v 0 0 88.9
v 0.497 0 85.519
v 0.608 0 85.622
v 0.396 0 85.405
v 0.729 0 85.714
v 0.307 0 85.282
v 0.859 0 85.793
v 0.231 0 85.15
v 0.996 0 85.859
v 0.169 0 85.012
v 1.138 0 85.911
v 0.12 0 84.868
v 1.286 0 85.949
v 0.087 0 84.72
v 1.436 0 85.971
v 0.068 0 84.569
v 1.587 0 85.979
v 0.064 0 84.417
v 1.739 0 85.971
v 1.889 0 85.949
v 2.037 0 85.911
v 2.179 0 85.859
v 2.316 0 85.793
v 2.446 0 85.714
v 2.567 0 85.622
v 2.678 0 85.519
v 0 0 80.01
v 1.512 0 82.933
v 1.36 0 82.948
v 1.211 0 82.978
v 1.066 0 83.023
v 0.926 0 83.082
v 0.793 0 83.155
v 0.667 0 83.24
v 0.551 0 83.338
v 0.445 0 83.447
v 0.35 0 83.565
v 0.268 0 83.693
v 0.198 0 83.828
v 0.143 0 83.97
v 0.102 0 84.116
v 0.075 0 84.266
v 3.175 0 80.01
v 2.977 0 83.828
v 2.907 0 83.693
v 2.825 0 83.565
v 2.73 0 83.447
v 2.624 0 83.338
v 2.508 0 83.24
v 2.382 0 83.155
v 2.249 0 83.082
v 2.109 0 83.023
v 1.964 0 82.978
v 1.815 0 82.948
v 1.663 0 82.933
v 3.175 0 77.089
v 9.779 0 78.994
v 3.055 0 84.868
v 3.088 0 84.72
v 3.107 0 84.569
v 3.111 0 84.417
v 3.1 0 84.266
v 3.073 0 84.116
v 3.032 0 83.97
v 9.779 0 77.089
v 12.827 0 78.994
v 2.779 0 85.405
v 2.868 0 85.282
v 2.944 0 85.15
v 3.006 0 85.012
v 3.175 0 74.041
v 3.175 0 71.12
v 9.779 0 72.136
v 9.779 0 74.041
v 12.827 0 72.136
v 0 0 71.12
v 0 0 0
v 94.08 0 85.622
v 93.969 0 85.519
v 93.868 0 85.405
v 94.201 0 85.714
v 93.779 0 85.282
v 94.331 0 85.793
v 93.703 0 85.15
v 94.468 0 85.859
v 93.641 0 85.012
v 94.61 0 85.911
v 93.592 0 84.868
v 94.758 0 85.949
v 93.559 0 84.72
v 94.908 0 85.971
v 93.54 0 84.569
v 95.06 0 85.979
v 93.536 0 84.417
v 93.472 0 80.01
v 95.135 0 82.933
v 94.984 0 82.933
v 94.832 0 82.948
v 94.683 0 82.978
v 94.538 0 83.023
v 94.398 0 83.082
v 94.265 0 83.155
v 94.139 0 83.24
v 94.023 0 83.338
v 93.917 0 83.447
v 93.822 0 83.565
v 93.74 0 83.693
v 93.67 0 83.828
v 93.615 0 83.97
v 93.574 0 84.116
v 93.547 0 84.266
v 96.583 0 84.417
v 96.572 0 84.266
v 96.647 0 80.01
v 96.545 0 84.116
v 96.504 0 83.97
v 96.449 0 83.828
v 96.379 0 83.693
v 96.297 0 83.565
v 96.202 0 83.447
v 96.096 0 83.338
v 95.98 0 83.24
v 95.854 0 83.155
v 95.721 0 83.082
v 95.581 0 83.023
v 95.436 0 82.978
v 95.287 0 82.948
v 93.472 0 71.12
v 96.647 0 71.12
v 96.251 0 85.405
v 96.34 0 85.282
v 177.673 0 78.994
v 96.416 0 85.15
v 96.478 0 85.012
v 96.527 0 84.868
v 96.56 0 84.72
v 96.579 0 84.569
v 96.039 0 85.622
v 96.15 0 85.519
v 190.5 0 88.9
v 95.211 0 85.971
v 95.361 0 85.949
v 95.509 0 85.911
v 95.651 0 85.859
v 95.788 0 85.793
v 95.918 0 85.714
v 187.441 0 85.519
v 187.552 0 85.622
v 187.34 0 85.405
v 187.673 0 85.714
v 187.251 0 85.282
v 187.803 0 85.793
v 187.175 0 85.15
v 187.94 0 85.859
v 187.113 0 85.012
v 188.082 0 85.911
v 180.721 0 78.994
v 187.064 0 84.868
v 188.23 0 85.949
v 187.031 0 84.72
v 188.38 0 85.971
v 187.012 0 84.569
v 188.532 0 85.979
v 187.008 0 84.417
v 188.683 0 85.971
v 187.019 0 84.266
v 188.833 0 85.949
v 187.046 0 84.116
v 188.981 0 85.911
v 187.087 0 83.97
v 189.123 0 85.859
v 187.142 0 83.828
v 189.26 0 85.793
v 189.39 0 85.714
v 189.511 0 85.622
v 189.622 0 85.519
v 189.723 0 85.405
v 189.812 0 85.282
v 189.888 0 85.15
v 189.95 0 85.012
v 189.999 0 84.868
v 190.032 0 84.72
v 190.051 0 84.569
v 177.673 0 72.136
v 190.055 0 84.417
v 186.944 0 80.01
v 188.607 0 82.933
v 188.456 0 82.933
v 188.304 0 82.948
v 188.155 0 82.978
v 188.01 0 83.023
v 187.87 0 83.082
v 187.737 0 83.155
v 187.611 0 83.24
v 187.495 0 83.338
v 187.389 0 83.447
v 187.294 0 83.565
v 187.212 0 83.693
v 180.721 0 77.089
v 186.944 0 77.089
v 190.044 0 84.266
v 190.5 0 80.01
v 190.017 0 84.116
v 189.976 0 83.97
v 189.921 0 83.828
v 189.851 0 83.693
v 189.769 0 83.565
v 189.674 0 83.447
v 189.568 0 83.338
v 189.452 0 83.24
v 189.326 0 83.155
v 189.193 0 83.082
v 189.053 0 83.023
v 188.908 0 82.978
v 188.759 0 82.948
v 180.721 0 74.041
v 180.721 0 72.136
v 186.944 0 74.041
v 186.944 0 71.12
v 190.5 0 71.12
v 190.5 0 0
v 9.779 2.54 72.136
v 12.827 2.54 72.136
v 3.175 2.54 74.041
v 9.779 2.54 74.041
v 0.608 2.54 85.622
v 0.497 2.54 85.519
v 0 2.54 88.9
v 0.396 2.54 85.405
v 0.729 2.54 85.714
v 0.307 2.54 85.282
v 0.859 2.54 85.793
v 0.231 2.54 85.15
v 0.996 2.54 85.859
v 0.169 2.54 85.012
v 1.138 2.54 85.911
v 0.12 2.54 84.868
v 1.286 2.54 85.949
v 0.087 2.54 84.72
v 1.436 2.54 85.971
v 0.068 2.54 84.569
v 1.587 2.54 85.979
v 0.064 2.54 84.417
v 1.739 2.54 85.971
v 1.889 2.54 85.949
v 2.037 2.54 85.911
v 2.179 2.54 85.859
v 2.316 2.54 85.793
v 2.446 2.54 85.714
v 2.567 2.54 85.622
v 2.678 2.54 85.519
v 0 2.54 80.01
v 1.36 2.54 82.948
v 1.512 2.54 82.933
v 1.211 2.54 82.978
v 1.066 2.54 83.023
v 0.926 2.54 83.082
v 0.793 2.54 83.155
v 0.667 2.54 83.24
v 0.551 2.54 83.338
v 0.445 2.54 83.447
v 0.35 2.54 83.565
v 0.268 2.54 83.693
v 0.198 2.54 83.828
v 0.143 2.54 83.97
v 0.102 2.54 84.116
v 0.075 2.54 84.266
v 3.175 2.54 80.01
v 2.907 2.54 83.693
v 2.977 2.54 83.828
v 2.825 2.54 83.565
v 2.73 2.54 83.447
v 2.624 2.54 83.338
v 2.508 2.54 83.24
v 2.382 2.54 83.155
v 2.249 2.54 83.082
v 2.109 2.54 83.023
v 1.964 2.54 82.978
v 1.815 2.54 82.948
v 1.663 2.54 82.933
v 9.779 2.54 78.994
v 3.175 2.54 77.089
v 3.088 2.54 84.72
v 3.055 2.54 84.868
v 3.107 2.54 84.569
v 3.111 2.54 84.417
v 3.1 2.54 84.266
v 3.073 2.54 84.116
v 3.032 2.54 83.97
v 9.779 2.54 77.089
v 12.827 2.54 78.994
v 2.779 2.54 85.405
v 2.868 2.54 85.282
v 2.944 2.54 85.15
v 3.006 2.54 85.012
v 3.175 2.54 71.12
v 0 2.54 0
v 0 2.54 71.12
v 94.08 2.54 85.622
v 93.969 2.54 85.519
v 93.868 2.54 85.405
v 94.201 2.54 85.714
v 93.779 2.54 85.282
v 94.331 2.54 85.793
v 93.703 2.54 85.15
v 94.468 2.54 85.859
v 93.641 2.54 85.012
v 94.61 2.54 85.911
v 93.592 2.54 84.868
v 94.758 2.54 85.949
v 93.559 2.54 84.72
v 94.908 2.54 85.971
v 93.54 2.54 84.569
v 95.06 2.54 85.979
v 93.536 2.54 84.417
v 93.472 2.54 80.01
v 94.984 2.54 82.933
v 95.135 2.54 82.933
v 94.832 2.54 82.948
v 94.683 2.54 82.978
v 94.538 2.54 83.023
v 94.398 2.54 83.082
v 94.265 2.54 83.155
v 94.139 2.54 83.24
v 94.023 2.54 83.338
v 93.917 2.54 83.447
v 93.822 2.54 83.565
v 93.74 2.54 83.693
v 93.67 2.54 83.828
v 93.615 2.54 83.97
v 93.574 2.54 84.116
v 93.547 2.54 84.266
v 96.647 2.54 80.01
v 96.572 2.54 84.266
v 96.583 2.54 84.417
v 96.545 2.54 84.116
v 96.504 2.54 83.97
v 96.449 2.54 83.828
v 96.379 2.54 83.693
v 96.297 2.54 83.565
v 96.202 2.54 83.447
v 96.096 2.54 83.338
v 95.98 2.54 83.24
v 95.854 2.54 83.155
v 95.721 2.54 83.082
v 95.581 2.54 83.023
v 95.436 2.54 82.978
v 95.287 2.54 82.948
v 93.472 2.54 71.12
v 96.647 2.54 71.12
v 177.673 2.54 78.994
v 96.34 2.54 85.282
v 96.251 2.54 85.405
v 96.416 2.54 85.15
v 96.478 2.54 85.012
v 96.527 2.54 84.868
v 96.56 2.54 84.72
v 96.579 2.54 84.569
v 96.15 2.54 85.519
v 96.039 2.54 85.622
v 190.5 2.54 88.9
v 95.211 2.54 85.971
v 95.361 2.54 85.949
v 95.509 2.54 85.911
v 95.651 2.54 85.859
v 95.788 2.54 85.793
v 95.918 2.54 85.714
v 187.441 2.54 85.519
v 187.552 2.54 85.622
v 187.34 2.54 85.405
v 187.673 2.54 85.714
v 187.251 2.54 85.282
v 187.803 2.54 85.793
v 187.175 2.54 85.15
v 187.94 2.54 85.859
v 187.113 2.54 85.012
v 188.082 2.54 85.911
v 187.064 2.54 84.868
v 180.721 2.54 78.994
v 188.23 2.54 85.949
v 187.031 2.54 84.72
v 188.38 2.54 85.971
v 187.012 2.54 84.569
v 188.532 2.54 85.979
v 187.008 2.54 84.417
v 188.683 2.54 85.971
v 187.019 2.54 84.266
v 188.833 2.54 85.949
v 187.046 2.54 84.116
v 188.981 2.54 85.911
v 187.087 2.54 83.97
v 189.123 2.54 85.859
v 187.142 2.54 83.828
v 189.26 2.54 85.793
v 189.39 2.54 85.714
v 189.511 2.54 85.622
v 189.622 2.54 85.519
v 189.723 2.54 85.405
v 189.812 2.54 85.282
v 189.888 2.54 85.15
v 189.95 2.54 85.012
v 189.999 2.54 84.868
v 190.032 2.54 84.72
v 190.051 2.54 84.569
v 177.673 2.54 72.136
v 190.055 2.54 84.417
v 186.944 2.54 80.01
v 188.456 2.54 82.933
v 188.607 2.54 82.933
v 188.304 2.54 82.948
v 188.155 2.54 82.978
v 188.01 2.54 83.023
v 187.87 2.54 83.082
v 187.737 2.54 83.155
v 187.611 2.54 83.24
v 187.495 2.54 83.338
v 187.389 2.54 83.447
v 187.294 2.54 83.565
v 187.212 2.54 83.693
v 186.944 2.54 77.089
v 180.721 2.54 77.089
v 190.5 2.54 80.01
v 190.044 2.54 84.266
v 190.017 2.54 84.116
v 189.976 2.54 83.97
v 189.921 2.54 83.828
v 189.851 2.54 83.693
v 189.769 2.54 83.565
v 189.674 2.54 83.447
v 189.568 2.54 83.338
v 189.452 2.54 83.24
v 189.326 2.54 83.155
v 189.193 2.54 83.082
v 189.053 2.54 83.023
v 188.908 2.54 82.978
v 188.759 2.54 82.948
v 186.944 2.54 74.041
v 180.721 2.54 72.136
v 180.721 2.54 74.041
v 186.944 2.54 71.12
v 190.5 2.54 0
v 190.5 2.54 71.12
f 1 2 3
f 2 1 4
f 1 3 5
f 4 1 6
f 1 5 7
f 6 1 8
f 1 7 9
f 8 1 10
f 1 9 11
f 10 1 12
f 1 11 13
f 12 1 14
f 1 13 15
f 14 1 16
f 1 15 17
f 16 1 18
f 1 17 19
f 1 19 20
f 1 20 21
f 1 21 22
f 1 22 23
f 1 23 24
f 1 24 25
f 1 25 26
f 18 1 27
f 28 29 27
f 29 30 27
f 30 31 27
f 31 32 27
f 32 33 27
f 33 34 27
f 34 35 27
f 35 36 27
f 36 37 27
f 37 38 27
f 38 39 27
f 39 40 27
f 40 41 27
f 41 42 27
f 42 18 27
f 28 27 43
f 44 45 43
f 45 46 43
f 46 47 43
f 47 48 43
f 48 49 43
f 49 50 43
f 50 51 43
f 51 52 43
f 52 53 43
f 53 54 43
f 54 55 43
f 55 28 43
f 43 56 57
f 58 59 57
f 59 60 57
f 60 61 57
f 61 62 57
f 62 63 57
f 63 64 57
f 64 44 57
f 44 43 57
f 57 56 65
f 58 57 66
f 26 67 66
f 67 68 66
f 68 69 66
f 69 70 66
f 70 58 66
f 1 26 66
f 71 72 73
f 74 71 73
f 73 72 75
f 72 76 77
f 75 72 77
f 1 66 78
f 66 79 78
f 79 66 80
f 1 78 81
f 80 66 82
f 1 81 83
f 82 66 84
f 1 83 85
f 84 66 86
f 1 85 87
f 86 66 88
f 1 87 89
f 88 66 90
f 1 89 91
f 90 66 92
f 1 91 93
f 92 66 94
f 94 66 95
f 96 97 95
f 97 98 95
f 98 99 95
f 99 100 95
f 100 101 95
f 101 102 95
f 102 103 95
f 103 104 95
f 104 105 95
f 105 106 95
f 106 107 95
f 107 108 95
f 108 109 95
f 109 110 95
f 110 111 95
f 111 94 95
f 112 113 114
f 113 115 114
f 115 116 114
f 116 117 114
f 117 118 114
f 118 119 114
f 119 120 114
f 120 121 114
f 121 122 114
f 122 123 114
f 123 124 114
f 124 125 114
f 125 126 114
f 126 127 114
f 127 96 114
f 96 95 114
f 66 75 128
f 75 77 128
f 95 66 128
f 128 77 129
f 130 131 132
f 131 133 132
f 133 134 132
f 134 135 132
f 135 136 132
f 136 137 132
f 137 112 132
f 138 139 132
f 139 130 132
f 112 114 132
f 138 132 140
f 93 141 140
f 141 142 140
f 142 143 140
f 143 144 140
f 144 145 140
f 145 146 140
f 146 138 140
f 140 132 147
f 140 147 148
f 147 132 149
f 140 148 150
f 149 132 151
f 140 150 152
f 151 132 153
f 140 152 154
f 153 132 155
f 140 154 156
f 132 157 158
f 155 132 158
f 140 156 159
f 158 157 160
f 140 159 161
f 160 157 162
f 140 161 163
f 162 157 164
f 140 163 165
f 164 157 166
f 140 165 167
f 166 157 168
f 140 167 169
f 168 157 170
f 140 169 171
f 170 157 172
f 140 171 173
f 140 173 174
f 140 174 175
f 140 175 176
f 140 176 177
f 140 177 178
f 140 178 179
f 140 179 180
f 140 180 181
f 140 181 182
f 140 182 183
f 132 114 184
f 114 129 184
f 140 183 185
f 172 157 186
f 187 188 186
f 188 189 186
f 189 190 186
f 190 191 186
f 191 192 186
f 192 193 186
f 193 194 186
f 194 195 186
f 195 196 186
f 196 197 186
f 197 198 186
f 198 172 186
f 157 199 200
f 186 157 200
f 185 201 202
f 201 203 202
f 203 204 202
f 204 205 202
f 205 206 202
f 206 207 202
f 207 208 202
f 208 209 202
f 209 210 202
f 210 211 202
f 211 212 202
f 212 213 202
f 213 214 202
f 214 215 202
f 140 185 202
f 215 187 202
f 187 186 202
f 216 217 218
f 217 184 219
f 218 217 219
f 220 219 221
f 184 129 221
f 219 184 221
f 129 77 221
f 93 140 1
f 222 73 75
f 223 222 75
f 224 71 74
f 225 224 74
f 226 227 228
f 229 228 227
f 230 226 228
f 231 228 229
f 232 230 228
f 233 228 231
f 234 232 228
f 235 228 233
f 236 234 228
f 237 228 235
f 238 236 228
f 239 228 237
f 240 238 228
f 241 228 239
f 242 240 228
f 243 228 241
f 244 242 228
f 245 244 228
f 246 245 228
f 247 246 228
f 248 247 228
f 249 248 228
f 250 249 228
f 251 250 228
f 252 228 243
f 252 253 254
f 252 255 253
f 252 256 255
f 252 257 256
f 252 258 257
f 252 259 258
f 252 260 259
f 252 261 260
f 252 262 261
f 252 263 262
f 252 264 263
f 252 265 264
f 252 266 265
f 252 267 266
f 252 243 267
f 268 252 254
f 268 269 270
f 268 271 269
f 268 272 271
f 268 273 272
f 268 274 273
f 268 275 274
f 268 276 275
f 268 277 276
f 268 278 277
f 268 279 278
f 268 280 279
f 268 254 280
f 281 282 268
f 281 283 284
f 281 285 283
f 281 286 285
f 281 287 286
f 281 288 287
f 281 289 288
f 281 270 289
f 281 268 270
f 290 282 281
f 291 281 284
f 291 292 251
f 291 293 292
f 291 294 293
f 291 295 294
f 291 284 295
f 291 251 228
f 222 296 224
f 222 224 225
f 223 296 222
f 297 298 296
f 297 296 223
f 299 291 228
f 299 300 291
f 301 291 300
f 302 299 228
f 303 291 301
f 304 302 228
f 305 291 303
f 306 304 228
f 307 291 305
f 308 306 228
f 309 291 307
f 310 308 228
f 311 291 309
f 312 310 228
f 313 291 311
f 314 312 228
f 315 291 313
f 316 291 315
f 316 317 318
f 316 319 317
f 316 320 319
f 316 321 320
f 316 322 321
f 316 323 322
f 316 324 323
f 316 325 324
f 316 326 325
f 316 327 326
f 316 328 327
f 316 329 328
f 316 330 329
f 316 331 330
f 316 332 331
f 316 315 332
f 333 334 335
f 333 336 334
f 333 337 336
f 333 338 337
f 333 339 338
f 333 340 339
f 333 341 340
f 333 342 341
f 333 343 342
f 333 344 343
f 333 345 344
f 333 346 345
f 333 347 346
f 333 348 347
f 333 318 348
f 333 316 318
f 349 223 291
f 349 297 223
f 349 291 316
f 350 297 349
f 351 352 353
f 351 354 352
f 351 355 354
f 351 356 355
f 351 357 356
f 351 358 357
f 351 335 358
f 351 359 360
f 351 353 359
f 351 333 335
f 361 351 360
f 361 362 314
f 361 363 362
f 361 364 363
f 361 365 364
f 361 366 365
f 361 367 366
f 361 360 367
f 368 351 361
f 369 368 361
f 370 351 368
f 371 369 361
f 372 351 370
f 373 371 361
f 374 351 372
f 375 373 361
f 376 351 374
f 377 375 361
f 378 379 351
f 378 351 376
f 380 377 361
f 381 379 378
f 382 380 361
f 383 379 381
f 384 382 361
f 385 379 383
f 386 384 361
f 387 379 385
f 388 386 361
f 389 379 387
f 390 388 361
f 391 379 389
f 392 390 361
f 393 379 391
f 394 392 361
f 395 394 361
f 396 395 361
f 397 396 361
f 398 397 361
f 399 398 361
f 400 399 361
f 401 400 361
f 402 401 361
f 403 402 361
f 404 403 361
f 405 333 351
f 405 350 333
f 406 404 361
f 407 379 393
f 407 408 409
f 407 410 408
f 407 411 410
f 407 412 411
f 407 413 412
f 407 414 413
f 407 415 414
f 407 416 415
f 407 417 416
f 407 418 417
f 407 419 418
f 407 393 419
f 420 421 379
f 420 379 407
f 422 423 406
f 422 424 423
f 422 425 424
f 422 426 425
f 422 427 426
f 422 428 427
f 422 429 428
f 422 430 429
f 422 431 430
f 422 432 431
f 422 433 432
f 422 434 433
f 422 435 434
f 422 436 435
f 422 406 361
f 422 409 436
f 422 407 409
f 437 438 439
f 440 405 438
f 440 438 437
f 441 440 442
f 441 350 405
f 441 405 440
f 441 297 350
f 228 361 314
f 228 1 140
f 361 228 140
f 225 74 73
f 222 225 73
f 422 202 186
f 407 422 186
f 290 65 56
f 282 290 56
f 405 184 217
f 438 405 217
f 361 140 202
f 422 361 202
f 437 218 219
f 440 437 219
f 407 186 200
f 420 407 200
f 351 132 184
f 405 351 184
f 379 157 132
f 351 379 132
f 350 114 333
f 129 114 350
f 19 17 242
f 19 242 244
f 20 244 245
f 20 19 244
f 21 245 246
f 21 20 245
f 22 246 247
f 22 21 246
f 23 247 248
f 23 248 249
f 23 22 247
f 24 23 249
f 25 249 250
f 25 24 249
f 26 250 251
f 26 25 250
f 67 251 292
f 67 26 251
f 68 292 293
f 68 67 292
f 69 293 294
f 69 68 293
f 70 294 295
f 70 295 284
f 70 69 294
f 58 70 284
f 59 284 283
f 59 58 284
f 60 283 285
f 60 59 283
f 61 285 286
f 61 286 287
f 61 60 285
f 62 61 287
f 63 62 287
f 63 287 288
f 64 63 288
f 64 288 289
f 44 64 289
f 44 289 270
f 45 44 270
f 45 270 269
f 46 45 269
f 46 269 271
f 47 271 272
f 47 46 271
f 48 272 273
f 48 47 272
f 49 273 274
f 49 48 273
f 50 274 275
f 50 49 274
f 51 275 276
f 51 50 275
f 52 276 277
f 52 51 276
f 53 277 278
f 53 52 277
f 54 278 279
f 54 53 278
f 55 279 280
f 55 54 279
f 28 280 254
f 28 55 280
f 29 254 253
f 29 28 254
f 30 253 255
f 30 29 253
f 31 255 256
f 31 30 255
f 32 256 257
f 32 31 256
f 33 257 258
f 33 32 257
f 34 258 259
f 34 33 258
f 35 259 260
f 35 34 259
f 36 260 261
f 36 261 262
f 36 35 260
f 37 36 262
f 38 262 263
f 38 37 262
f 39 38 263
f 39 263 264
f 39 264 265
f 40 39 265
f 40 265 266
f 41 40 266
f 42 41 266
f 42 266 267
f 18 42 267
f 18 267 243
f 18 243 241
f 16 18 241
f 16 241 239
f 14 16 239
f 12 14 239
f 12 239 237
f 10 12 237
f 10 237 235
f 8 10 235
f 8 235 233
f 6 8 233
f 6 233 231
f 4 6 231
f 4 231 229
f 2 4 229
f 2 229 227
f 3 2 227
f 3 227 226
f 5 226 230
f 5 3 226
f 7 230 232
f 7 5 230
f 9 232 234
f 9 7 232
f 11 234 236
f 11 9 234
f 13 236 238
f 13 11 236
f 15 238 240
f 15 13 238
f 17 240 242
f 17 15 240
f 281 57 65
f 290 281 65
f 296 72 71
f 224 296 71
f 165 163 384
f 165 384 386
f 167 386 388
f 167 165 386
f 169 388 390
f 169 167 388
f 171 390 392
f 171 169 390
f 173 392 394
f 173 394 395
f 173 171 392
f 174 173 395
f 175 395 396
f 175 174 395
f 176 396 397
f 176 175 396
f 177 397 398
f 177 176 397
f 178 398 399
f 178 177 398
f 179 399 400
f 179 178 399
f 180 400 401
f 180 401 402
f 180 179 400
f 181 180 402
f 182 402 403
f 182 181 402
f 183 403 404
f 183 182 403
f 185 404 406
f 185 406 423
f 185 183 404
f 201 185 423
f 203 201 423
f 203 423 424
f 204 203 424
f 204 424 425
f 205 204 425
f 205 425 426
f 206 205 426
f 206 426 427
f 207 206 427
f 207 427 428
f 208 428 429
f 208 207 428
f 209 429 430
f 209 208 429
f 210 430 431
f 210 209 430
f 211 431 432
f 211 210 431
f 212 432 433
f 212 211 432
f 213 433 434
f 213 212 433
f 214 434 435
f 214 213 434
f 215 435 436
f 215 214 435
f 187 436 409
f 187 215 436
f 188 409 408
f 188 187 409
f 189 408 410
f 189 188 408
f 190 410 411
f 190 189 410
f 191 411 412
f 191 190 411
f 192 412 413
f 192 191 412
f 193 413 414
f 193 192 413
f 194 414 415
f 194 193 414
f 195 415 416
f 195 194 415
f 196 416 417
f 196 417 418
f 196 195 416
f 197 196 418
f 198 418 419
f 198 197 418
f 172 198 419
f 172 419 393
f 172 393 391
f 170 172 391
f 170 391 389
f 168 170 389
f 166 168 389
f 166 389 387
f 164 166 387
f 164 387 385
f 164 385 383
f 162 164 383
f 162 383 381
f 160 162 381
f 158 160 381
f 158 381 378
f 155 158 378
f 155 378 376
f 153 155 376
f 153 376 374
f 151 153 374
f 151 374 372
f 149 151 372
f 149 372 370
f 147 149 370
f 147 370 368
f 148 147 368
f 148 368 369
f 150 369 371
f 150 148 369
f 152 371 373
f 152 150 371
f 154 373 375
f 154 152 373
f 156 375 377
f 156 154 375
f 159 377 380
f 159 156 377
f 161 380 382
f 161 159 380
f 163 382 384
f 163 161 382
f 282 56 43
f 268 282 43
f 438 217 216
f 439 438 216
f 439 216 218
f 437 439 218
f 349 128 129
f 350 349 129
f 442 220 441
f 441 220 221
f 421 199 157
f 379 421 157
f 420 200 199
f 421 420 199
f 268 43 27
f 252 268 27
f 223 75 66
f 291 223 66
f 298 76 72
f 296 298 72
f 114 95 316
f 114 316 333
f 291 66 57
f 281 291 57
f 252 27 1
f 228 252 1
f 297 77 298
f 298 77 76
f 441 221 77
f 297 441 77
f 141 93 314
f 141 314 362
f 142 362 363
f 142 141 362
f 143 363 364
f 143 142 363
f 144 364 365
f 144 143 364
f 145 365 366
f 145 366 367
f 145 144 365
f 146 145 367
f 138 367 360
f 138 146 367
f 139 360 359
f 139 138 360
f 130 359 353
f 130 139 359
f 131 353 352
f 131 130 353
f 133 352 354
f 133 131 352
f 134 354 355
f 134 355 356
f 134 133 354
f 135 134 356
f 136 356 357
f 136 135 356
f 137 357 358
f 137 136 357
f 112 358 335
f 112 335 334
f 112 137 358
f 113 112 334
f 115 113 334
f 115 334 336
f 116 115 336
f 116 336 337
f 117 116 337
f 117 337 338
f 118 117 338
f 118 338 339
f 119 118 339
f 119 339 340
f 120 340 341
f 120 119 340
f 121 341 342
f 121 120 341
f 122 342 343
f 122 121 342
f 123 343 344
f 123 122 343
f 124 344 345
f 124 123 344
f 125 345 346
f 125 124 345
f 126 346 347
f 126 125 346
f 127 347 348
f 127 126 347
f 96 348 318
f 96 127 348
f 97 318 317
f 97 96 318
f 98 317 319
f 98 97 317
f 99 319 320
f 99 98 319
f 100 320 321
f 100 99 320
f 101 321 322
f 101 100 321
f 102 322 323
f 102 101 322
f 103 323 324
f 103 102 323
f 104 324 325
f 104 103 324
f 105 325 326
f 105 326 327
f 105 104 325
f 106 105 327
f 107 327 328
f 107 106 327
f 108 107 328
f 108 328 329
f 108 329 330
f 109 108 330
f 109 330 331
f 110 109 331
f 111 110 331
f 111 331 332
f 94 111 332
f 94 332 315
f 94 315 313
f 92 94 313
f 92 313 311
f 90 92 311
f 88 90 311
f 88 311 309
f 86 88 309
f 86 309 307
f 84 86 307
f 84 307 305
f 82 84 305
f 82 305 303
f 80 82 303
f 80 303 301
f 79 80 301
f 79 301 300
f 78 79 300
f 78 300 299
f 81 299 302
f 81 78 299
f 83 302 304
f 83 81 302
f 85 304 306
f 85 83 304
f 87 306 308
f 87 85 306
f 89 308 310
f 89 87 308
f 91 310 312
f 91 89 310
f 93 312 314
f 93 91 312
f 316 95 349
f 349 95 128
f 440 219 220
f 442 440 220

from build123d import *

# Parameters (mm, degrees)
SKETCH1_W           = 3.175
SKETCH1_H           = 8.89
SKETCH1_R           = 1.524
BOSS_EXTRUDE1_DEPTH = 2.54


with BuildPart() as part:
    # Sketch1 → Boss-Extrude1 (new body)
    with BuildSketch(Plane(origin=(0, 0, 0), x_dir=(1, 0, 0), z_dir=(0, 1, 0))):
        Polygon((186.944, -80.01), (186.944, -77.089), (180.721, -77.089), (180.721, -78.994), (177.673, -78.994), (177.673, -72.136), (180.721, -72.136), (180.721, -74.041), (186.944, -74.041), (186.944, -71.12), (190.5, -71.12), (190.5, 0), (0, 0), (0, -71.12), (3.175, -71.12), (3.175, -74.041), (9.779, -74.041), (9.779, -72.136), (12.827, -72.136), (12.827, -78.994), (9.779, -78.994), (9.779, -77.089), (3.175, -77.089), (3.175, -80.01), (0, -80.01), (0, -88.9), (190.5, -88.9), (190.5, -80.01), align=None)
        with Locations((95.0595, -75.565)):
            Rectangle(SKETCH1_W, SKETCH1_H, mode=Mode.SUBTRACT)
        with Locations(Location((95.0595, -84.455, 0), (0, 0, 270))):
            Circle(SKETCH1_R, mode=Mode.SUBTRACT)
        with Locations(Location((1.5875, -84.455, 0), (0, 0, 270))):
            Circle(SKETCH1_R, mode=Mode.SUBTRACT)
        with Locations(Location((188.5315, -84.455, 0), (0, 0, 270))):
            Circle(SKETCH1_R, mode=Mode.SUBTRACT)
    extrude(amount=BOSS_EXTRUDE1_DEPTH)


solid = part.part
